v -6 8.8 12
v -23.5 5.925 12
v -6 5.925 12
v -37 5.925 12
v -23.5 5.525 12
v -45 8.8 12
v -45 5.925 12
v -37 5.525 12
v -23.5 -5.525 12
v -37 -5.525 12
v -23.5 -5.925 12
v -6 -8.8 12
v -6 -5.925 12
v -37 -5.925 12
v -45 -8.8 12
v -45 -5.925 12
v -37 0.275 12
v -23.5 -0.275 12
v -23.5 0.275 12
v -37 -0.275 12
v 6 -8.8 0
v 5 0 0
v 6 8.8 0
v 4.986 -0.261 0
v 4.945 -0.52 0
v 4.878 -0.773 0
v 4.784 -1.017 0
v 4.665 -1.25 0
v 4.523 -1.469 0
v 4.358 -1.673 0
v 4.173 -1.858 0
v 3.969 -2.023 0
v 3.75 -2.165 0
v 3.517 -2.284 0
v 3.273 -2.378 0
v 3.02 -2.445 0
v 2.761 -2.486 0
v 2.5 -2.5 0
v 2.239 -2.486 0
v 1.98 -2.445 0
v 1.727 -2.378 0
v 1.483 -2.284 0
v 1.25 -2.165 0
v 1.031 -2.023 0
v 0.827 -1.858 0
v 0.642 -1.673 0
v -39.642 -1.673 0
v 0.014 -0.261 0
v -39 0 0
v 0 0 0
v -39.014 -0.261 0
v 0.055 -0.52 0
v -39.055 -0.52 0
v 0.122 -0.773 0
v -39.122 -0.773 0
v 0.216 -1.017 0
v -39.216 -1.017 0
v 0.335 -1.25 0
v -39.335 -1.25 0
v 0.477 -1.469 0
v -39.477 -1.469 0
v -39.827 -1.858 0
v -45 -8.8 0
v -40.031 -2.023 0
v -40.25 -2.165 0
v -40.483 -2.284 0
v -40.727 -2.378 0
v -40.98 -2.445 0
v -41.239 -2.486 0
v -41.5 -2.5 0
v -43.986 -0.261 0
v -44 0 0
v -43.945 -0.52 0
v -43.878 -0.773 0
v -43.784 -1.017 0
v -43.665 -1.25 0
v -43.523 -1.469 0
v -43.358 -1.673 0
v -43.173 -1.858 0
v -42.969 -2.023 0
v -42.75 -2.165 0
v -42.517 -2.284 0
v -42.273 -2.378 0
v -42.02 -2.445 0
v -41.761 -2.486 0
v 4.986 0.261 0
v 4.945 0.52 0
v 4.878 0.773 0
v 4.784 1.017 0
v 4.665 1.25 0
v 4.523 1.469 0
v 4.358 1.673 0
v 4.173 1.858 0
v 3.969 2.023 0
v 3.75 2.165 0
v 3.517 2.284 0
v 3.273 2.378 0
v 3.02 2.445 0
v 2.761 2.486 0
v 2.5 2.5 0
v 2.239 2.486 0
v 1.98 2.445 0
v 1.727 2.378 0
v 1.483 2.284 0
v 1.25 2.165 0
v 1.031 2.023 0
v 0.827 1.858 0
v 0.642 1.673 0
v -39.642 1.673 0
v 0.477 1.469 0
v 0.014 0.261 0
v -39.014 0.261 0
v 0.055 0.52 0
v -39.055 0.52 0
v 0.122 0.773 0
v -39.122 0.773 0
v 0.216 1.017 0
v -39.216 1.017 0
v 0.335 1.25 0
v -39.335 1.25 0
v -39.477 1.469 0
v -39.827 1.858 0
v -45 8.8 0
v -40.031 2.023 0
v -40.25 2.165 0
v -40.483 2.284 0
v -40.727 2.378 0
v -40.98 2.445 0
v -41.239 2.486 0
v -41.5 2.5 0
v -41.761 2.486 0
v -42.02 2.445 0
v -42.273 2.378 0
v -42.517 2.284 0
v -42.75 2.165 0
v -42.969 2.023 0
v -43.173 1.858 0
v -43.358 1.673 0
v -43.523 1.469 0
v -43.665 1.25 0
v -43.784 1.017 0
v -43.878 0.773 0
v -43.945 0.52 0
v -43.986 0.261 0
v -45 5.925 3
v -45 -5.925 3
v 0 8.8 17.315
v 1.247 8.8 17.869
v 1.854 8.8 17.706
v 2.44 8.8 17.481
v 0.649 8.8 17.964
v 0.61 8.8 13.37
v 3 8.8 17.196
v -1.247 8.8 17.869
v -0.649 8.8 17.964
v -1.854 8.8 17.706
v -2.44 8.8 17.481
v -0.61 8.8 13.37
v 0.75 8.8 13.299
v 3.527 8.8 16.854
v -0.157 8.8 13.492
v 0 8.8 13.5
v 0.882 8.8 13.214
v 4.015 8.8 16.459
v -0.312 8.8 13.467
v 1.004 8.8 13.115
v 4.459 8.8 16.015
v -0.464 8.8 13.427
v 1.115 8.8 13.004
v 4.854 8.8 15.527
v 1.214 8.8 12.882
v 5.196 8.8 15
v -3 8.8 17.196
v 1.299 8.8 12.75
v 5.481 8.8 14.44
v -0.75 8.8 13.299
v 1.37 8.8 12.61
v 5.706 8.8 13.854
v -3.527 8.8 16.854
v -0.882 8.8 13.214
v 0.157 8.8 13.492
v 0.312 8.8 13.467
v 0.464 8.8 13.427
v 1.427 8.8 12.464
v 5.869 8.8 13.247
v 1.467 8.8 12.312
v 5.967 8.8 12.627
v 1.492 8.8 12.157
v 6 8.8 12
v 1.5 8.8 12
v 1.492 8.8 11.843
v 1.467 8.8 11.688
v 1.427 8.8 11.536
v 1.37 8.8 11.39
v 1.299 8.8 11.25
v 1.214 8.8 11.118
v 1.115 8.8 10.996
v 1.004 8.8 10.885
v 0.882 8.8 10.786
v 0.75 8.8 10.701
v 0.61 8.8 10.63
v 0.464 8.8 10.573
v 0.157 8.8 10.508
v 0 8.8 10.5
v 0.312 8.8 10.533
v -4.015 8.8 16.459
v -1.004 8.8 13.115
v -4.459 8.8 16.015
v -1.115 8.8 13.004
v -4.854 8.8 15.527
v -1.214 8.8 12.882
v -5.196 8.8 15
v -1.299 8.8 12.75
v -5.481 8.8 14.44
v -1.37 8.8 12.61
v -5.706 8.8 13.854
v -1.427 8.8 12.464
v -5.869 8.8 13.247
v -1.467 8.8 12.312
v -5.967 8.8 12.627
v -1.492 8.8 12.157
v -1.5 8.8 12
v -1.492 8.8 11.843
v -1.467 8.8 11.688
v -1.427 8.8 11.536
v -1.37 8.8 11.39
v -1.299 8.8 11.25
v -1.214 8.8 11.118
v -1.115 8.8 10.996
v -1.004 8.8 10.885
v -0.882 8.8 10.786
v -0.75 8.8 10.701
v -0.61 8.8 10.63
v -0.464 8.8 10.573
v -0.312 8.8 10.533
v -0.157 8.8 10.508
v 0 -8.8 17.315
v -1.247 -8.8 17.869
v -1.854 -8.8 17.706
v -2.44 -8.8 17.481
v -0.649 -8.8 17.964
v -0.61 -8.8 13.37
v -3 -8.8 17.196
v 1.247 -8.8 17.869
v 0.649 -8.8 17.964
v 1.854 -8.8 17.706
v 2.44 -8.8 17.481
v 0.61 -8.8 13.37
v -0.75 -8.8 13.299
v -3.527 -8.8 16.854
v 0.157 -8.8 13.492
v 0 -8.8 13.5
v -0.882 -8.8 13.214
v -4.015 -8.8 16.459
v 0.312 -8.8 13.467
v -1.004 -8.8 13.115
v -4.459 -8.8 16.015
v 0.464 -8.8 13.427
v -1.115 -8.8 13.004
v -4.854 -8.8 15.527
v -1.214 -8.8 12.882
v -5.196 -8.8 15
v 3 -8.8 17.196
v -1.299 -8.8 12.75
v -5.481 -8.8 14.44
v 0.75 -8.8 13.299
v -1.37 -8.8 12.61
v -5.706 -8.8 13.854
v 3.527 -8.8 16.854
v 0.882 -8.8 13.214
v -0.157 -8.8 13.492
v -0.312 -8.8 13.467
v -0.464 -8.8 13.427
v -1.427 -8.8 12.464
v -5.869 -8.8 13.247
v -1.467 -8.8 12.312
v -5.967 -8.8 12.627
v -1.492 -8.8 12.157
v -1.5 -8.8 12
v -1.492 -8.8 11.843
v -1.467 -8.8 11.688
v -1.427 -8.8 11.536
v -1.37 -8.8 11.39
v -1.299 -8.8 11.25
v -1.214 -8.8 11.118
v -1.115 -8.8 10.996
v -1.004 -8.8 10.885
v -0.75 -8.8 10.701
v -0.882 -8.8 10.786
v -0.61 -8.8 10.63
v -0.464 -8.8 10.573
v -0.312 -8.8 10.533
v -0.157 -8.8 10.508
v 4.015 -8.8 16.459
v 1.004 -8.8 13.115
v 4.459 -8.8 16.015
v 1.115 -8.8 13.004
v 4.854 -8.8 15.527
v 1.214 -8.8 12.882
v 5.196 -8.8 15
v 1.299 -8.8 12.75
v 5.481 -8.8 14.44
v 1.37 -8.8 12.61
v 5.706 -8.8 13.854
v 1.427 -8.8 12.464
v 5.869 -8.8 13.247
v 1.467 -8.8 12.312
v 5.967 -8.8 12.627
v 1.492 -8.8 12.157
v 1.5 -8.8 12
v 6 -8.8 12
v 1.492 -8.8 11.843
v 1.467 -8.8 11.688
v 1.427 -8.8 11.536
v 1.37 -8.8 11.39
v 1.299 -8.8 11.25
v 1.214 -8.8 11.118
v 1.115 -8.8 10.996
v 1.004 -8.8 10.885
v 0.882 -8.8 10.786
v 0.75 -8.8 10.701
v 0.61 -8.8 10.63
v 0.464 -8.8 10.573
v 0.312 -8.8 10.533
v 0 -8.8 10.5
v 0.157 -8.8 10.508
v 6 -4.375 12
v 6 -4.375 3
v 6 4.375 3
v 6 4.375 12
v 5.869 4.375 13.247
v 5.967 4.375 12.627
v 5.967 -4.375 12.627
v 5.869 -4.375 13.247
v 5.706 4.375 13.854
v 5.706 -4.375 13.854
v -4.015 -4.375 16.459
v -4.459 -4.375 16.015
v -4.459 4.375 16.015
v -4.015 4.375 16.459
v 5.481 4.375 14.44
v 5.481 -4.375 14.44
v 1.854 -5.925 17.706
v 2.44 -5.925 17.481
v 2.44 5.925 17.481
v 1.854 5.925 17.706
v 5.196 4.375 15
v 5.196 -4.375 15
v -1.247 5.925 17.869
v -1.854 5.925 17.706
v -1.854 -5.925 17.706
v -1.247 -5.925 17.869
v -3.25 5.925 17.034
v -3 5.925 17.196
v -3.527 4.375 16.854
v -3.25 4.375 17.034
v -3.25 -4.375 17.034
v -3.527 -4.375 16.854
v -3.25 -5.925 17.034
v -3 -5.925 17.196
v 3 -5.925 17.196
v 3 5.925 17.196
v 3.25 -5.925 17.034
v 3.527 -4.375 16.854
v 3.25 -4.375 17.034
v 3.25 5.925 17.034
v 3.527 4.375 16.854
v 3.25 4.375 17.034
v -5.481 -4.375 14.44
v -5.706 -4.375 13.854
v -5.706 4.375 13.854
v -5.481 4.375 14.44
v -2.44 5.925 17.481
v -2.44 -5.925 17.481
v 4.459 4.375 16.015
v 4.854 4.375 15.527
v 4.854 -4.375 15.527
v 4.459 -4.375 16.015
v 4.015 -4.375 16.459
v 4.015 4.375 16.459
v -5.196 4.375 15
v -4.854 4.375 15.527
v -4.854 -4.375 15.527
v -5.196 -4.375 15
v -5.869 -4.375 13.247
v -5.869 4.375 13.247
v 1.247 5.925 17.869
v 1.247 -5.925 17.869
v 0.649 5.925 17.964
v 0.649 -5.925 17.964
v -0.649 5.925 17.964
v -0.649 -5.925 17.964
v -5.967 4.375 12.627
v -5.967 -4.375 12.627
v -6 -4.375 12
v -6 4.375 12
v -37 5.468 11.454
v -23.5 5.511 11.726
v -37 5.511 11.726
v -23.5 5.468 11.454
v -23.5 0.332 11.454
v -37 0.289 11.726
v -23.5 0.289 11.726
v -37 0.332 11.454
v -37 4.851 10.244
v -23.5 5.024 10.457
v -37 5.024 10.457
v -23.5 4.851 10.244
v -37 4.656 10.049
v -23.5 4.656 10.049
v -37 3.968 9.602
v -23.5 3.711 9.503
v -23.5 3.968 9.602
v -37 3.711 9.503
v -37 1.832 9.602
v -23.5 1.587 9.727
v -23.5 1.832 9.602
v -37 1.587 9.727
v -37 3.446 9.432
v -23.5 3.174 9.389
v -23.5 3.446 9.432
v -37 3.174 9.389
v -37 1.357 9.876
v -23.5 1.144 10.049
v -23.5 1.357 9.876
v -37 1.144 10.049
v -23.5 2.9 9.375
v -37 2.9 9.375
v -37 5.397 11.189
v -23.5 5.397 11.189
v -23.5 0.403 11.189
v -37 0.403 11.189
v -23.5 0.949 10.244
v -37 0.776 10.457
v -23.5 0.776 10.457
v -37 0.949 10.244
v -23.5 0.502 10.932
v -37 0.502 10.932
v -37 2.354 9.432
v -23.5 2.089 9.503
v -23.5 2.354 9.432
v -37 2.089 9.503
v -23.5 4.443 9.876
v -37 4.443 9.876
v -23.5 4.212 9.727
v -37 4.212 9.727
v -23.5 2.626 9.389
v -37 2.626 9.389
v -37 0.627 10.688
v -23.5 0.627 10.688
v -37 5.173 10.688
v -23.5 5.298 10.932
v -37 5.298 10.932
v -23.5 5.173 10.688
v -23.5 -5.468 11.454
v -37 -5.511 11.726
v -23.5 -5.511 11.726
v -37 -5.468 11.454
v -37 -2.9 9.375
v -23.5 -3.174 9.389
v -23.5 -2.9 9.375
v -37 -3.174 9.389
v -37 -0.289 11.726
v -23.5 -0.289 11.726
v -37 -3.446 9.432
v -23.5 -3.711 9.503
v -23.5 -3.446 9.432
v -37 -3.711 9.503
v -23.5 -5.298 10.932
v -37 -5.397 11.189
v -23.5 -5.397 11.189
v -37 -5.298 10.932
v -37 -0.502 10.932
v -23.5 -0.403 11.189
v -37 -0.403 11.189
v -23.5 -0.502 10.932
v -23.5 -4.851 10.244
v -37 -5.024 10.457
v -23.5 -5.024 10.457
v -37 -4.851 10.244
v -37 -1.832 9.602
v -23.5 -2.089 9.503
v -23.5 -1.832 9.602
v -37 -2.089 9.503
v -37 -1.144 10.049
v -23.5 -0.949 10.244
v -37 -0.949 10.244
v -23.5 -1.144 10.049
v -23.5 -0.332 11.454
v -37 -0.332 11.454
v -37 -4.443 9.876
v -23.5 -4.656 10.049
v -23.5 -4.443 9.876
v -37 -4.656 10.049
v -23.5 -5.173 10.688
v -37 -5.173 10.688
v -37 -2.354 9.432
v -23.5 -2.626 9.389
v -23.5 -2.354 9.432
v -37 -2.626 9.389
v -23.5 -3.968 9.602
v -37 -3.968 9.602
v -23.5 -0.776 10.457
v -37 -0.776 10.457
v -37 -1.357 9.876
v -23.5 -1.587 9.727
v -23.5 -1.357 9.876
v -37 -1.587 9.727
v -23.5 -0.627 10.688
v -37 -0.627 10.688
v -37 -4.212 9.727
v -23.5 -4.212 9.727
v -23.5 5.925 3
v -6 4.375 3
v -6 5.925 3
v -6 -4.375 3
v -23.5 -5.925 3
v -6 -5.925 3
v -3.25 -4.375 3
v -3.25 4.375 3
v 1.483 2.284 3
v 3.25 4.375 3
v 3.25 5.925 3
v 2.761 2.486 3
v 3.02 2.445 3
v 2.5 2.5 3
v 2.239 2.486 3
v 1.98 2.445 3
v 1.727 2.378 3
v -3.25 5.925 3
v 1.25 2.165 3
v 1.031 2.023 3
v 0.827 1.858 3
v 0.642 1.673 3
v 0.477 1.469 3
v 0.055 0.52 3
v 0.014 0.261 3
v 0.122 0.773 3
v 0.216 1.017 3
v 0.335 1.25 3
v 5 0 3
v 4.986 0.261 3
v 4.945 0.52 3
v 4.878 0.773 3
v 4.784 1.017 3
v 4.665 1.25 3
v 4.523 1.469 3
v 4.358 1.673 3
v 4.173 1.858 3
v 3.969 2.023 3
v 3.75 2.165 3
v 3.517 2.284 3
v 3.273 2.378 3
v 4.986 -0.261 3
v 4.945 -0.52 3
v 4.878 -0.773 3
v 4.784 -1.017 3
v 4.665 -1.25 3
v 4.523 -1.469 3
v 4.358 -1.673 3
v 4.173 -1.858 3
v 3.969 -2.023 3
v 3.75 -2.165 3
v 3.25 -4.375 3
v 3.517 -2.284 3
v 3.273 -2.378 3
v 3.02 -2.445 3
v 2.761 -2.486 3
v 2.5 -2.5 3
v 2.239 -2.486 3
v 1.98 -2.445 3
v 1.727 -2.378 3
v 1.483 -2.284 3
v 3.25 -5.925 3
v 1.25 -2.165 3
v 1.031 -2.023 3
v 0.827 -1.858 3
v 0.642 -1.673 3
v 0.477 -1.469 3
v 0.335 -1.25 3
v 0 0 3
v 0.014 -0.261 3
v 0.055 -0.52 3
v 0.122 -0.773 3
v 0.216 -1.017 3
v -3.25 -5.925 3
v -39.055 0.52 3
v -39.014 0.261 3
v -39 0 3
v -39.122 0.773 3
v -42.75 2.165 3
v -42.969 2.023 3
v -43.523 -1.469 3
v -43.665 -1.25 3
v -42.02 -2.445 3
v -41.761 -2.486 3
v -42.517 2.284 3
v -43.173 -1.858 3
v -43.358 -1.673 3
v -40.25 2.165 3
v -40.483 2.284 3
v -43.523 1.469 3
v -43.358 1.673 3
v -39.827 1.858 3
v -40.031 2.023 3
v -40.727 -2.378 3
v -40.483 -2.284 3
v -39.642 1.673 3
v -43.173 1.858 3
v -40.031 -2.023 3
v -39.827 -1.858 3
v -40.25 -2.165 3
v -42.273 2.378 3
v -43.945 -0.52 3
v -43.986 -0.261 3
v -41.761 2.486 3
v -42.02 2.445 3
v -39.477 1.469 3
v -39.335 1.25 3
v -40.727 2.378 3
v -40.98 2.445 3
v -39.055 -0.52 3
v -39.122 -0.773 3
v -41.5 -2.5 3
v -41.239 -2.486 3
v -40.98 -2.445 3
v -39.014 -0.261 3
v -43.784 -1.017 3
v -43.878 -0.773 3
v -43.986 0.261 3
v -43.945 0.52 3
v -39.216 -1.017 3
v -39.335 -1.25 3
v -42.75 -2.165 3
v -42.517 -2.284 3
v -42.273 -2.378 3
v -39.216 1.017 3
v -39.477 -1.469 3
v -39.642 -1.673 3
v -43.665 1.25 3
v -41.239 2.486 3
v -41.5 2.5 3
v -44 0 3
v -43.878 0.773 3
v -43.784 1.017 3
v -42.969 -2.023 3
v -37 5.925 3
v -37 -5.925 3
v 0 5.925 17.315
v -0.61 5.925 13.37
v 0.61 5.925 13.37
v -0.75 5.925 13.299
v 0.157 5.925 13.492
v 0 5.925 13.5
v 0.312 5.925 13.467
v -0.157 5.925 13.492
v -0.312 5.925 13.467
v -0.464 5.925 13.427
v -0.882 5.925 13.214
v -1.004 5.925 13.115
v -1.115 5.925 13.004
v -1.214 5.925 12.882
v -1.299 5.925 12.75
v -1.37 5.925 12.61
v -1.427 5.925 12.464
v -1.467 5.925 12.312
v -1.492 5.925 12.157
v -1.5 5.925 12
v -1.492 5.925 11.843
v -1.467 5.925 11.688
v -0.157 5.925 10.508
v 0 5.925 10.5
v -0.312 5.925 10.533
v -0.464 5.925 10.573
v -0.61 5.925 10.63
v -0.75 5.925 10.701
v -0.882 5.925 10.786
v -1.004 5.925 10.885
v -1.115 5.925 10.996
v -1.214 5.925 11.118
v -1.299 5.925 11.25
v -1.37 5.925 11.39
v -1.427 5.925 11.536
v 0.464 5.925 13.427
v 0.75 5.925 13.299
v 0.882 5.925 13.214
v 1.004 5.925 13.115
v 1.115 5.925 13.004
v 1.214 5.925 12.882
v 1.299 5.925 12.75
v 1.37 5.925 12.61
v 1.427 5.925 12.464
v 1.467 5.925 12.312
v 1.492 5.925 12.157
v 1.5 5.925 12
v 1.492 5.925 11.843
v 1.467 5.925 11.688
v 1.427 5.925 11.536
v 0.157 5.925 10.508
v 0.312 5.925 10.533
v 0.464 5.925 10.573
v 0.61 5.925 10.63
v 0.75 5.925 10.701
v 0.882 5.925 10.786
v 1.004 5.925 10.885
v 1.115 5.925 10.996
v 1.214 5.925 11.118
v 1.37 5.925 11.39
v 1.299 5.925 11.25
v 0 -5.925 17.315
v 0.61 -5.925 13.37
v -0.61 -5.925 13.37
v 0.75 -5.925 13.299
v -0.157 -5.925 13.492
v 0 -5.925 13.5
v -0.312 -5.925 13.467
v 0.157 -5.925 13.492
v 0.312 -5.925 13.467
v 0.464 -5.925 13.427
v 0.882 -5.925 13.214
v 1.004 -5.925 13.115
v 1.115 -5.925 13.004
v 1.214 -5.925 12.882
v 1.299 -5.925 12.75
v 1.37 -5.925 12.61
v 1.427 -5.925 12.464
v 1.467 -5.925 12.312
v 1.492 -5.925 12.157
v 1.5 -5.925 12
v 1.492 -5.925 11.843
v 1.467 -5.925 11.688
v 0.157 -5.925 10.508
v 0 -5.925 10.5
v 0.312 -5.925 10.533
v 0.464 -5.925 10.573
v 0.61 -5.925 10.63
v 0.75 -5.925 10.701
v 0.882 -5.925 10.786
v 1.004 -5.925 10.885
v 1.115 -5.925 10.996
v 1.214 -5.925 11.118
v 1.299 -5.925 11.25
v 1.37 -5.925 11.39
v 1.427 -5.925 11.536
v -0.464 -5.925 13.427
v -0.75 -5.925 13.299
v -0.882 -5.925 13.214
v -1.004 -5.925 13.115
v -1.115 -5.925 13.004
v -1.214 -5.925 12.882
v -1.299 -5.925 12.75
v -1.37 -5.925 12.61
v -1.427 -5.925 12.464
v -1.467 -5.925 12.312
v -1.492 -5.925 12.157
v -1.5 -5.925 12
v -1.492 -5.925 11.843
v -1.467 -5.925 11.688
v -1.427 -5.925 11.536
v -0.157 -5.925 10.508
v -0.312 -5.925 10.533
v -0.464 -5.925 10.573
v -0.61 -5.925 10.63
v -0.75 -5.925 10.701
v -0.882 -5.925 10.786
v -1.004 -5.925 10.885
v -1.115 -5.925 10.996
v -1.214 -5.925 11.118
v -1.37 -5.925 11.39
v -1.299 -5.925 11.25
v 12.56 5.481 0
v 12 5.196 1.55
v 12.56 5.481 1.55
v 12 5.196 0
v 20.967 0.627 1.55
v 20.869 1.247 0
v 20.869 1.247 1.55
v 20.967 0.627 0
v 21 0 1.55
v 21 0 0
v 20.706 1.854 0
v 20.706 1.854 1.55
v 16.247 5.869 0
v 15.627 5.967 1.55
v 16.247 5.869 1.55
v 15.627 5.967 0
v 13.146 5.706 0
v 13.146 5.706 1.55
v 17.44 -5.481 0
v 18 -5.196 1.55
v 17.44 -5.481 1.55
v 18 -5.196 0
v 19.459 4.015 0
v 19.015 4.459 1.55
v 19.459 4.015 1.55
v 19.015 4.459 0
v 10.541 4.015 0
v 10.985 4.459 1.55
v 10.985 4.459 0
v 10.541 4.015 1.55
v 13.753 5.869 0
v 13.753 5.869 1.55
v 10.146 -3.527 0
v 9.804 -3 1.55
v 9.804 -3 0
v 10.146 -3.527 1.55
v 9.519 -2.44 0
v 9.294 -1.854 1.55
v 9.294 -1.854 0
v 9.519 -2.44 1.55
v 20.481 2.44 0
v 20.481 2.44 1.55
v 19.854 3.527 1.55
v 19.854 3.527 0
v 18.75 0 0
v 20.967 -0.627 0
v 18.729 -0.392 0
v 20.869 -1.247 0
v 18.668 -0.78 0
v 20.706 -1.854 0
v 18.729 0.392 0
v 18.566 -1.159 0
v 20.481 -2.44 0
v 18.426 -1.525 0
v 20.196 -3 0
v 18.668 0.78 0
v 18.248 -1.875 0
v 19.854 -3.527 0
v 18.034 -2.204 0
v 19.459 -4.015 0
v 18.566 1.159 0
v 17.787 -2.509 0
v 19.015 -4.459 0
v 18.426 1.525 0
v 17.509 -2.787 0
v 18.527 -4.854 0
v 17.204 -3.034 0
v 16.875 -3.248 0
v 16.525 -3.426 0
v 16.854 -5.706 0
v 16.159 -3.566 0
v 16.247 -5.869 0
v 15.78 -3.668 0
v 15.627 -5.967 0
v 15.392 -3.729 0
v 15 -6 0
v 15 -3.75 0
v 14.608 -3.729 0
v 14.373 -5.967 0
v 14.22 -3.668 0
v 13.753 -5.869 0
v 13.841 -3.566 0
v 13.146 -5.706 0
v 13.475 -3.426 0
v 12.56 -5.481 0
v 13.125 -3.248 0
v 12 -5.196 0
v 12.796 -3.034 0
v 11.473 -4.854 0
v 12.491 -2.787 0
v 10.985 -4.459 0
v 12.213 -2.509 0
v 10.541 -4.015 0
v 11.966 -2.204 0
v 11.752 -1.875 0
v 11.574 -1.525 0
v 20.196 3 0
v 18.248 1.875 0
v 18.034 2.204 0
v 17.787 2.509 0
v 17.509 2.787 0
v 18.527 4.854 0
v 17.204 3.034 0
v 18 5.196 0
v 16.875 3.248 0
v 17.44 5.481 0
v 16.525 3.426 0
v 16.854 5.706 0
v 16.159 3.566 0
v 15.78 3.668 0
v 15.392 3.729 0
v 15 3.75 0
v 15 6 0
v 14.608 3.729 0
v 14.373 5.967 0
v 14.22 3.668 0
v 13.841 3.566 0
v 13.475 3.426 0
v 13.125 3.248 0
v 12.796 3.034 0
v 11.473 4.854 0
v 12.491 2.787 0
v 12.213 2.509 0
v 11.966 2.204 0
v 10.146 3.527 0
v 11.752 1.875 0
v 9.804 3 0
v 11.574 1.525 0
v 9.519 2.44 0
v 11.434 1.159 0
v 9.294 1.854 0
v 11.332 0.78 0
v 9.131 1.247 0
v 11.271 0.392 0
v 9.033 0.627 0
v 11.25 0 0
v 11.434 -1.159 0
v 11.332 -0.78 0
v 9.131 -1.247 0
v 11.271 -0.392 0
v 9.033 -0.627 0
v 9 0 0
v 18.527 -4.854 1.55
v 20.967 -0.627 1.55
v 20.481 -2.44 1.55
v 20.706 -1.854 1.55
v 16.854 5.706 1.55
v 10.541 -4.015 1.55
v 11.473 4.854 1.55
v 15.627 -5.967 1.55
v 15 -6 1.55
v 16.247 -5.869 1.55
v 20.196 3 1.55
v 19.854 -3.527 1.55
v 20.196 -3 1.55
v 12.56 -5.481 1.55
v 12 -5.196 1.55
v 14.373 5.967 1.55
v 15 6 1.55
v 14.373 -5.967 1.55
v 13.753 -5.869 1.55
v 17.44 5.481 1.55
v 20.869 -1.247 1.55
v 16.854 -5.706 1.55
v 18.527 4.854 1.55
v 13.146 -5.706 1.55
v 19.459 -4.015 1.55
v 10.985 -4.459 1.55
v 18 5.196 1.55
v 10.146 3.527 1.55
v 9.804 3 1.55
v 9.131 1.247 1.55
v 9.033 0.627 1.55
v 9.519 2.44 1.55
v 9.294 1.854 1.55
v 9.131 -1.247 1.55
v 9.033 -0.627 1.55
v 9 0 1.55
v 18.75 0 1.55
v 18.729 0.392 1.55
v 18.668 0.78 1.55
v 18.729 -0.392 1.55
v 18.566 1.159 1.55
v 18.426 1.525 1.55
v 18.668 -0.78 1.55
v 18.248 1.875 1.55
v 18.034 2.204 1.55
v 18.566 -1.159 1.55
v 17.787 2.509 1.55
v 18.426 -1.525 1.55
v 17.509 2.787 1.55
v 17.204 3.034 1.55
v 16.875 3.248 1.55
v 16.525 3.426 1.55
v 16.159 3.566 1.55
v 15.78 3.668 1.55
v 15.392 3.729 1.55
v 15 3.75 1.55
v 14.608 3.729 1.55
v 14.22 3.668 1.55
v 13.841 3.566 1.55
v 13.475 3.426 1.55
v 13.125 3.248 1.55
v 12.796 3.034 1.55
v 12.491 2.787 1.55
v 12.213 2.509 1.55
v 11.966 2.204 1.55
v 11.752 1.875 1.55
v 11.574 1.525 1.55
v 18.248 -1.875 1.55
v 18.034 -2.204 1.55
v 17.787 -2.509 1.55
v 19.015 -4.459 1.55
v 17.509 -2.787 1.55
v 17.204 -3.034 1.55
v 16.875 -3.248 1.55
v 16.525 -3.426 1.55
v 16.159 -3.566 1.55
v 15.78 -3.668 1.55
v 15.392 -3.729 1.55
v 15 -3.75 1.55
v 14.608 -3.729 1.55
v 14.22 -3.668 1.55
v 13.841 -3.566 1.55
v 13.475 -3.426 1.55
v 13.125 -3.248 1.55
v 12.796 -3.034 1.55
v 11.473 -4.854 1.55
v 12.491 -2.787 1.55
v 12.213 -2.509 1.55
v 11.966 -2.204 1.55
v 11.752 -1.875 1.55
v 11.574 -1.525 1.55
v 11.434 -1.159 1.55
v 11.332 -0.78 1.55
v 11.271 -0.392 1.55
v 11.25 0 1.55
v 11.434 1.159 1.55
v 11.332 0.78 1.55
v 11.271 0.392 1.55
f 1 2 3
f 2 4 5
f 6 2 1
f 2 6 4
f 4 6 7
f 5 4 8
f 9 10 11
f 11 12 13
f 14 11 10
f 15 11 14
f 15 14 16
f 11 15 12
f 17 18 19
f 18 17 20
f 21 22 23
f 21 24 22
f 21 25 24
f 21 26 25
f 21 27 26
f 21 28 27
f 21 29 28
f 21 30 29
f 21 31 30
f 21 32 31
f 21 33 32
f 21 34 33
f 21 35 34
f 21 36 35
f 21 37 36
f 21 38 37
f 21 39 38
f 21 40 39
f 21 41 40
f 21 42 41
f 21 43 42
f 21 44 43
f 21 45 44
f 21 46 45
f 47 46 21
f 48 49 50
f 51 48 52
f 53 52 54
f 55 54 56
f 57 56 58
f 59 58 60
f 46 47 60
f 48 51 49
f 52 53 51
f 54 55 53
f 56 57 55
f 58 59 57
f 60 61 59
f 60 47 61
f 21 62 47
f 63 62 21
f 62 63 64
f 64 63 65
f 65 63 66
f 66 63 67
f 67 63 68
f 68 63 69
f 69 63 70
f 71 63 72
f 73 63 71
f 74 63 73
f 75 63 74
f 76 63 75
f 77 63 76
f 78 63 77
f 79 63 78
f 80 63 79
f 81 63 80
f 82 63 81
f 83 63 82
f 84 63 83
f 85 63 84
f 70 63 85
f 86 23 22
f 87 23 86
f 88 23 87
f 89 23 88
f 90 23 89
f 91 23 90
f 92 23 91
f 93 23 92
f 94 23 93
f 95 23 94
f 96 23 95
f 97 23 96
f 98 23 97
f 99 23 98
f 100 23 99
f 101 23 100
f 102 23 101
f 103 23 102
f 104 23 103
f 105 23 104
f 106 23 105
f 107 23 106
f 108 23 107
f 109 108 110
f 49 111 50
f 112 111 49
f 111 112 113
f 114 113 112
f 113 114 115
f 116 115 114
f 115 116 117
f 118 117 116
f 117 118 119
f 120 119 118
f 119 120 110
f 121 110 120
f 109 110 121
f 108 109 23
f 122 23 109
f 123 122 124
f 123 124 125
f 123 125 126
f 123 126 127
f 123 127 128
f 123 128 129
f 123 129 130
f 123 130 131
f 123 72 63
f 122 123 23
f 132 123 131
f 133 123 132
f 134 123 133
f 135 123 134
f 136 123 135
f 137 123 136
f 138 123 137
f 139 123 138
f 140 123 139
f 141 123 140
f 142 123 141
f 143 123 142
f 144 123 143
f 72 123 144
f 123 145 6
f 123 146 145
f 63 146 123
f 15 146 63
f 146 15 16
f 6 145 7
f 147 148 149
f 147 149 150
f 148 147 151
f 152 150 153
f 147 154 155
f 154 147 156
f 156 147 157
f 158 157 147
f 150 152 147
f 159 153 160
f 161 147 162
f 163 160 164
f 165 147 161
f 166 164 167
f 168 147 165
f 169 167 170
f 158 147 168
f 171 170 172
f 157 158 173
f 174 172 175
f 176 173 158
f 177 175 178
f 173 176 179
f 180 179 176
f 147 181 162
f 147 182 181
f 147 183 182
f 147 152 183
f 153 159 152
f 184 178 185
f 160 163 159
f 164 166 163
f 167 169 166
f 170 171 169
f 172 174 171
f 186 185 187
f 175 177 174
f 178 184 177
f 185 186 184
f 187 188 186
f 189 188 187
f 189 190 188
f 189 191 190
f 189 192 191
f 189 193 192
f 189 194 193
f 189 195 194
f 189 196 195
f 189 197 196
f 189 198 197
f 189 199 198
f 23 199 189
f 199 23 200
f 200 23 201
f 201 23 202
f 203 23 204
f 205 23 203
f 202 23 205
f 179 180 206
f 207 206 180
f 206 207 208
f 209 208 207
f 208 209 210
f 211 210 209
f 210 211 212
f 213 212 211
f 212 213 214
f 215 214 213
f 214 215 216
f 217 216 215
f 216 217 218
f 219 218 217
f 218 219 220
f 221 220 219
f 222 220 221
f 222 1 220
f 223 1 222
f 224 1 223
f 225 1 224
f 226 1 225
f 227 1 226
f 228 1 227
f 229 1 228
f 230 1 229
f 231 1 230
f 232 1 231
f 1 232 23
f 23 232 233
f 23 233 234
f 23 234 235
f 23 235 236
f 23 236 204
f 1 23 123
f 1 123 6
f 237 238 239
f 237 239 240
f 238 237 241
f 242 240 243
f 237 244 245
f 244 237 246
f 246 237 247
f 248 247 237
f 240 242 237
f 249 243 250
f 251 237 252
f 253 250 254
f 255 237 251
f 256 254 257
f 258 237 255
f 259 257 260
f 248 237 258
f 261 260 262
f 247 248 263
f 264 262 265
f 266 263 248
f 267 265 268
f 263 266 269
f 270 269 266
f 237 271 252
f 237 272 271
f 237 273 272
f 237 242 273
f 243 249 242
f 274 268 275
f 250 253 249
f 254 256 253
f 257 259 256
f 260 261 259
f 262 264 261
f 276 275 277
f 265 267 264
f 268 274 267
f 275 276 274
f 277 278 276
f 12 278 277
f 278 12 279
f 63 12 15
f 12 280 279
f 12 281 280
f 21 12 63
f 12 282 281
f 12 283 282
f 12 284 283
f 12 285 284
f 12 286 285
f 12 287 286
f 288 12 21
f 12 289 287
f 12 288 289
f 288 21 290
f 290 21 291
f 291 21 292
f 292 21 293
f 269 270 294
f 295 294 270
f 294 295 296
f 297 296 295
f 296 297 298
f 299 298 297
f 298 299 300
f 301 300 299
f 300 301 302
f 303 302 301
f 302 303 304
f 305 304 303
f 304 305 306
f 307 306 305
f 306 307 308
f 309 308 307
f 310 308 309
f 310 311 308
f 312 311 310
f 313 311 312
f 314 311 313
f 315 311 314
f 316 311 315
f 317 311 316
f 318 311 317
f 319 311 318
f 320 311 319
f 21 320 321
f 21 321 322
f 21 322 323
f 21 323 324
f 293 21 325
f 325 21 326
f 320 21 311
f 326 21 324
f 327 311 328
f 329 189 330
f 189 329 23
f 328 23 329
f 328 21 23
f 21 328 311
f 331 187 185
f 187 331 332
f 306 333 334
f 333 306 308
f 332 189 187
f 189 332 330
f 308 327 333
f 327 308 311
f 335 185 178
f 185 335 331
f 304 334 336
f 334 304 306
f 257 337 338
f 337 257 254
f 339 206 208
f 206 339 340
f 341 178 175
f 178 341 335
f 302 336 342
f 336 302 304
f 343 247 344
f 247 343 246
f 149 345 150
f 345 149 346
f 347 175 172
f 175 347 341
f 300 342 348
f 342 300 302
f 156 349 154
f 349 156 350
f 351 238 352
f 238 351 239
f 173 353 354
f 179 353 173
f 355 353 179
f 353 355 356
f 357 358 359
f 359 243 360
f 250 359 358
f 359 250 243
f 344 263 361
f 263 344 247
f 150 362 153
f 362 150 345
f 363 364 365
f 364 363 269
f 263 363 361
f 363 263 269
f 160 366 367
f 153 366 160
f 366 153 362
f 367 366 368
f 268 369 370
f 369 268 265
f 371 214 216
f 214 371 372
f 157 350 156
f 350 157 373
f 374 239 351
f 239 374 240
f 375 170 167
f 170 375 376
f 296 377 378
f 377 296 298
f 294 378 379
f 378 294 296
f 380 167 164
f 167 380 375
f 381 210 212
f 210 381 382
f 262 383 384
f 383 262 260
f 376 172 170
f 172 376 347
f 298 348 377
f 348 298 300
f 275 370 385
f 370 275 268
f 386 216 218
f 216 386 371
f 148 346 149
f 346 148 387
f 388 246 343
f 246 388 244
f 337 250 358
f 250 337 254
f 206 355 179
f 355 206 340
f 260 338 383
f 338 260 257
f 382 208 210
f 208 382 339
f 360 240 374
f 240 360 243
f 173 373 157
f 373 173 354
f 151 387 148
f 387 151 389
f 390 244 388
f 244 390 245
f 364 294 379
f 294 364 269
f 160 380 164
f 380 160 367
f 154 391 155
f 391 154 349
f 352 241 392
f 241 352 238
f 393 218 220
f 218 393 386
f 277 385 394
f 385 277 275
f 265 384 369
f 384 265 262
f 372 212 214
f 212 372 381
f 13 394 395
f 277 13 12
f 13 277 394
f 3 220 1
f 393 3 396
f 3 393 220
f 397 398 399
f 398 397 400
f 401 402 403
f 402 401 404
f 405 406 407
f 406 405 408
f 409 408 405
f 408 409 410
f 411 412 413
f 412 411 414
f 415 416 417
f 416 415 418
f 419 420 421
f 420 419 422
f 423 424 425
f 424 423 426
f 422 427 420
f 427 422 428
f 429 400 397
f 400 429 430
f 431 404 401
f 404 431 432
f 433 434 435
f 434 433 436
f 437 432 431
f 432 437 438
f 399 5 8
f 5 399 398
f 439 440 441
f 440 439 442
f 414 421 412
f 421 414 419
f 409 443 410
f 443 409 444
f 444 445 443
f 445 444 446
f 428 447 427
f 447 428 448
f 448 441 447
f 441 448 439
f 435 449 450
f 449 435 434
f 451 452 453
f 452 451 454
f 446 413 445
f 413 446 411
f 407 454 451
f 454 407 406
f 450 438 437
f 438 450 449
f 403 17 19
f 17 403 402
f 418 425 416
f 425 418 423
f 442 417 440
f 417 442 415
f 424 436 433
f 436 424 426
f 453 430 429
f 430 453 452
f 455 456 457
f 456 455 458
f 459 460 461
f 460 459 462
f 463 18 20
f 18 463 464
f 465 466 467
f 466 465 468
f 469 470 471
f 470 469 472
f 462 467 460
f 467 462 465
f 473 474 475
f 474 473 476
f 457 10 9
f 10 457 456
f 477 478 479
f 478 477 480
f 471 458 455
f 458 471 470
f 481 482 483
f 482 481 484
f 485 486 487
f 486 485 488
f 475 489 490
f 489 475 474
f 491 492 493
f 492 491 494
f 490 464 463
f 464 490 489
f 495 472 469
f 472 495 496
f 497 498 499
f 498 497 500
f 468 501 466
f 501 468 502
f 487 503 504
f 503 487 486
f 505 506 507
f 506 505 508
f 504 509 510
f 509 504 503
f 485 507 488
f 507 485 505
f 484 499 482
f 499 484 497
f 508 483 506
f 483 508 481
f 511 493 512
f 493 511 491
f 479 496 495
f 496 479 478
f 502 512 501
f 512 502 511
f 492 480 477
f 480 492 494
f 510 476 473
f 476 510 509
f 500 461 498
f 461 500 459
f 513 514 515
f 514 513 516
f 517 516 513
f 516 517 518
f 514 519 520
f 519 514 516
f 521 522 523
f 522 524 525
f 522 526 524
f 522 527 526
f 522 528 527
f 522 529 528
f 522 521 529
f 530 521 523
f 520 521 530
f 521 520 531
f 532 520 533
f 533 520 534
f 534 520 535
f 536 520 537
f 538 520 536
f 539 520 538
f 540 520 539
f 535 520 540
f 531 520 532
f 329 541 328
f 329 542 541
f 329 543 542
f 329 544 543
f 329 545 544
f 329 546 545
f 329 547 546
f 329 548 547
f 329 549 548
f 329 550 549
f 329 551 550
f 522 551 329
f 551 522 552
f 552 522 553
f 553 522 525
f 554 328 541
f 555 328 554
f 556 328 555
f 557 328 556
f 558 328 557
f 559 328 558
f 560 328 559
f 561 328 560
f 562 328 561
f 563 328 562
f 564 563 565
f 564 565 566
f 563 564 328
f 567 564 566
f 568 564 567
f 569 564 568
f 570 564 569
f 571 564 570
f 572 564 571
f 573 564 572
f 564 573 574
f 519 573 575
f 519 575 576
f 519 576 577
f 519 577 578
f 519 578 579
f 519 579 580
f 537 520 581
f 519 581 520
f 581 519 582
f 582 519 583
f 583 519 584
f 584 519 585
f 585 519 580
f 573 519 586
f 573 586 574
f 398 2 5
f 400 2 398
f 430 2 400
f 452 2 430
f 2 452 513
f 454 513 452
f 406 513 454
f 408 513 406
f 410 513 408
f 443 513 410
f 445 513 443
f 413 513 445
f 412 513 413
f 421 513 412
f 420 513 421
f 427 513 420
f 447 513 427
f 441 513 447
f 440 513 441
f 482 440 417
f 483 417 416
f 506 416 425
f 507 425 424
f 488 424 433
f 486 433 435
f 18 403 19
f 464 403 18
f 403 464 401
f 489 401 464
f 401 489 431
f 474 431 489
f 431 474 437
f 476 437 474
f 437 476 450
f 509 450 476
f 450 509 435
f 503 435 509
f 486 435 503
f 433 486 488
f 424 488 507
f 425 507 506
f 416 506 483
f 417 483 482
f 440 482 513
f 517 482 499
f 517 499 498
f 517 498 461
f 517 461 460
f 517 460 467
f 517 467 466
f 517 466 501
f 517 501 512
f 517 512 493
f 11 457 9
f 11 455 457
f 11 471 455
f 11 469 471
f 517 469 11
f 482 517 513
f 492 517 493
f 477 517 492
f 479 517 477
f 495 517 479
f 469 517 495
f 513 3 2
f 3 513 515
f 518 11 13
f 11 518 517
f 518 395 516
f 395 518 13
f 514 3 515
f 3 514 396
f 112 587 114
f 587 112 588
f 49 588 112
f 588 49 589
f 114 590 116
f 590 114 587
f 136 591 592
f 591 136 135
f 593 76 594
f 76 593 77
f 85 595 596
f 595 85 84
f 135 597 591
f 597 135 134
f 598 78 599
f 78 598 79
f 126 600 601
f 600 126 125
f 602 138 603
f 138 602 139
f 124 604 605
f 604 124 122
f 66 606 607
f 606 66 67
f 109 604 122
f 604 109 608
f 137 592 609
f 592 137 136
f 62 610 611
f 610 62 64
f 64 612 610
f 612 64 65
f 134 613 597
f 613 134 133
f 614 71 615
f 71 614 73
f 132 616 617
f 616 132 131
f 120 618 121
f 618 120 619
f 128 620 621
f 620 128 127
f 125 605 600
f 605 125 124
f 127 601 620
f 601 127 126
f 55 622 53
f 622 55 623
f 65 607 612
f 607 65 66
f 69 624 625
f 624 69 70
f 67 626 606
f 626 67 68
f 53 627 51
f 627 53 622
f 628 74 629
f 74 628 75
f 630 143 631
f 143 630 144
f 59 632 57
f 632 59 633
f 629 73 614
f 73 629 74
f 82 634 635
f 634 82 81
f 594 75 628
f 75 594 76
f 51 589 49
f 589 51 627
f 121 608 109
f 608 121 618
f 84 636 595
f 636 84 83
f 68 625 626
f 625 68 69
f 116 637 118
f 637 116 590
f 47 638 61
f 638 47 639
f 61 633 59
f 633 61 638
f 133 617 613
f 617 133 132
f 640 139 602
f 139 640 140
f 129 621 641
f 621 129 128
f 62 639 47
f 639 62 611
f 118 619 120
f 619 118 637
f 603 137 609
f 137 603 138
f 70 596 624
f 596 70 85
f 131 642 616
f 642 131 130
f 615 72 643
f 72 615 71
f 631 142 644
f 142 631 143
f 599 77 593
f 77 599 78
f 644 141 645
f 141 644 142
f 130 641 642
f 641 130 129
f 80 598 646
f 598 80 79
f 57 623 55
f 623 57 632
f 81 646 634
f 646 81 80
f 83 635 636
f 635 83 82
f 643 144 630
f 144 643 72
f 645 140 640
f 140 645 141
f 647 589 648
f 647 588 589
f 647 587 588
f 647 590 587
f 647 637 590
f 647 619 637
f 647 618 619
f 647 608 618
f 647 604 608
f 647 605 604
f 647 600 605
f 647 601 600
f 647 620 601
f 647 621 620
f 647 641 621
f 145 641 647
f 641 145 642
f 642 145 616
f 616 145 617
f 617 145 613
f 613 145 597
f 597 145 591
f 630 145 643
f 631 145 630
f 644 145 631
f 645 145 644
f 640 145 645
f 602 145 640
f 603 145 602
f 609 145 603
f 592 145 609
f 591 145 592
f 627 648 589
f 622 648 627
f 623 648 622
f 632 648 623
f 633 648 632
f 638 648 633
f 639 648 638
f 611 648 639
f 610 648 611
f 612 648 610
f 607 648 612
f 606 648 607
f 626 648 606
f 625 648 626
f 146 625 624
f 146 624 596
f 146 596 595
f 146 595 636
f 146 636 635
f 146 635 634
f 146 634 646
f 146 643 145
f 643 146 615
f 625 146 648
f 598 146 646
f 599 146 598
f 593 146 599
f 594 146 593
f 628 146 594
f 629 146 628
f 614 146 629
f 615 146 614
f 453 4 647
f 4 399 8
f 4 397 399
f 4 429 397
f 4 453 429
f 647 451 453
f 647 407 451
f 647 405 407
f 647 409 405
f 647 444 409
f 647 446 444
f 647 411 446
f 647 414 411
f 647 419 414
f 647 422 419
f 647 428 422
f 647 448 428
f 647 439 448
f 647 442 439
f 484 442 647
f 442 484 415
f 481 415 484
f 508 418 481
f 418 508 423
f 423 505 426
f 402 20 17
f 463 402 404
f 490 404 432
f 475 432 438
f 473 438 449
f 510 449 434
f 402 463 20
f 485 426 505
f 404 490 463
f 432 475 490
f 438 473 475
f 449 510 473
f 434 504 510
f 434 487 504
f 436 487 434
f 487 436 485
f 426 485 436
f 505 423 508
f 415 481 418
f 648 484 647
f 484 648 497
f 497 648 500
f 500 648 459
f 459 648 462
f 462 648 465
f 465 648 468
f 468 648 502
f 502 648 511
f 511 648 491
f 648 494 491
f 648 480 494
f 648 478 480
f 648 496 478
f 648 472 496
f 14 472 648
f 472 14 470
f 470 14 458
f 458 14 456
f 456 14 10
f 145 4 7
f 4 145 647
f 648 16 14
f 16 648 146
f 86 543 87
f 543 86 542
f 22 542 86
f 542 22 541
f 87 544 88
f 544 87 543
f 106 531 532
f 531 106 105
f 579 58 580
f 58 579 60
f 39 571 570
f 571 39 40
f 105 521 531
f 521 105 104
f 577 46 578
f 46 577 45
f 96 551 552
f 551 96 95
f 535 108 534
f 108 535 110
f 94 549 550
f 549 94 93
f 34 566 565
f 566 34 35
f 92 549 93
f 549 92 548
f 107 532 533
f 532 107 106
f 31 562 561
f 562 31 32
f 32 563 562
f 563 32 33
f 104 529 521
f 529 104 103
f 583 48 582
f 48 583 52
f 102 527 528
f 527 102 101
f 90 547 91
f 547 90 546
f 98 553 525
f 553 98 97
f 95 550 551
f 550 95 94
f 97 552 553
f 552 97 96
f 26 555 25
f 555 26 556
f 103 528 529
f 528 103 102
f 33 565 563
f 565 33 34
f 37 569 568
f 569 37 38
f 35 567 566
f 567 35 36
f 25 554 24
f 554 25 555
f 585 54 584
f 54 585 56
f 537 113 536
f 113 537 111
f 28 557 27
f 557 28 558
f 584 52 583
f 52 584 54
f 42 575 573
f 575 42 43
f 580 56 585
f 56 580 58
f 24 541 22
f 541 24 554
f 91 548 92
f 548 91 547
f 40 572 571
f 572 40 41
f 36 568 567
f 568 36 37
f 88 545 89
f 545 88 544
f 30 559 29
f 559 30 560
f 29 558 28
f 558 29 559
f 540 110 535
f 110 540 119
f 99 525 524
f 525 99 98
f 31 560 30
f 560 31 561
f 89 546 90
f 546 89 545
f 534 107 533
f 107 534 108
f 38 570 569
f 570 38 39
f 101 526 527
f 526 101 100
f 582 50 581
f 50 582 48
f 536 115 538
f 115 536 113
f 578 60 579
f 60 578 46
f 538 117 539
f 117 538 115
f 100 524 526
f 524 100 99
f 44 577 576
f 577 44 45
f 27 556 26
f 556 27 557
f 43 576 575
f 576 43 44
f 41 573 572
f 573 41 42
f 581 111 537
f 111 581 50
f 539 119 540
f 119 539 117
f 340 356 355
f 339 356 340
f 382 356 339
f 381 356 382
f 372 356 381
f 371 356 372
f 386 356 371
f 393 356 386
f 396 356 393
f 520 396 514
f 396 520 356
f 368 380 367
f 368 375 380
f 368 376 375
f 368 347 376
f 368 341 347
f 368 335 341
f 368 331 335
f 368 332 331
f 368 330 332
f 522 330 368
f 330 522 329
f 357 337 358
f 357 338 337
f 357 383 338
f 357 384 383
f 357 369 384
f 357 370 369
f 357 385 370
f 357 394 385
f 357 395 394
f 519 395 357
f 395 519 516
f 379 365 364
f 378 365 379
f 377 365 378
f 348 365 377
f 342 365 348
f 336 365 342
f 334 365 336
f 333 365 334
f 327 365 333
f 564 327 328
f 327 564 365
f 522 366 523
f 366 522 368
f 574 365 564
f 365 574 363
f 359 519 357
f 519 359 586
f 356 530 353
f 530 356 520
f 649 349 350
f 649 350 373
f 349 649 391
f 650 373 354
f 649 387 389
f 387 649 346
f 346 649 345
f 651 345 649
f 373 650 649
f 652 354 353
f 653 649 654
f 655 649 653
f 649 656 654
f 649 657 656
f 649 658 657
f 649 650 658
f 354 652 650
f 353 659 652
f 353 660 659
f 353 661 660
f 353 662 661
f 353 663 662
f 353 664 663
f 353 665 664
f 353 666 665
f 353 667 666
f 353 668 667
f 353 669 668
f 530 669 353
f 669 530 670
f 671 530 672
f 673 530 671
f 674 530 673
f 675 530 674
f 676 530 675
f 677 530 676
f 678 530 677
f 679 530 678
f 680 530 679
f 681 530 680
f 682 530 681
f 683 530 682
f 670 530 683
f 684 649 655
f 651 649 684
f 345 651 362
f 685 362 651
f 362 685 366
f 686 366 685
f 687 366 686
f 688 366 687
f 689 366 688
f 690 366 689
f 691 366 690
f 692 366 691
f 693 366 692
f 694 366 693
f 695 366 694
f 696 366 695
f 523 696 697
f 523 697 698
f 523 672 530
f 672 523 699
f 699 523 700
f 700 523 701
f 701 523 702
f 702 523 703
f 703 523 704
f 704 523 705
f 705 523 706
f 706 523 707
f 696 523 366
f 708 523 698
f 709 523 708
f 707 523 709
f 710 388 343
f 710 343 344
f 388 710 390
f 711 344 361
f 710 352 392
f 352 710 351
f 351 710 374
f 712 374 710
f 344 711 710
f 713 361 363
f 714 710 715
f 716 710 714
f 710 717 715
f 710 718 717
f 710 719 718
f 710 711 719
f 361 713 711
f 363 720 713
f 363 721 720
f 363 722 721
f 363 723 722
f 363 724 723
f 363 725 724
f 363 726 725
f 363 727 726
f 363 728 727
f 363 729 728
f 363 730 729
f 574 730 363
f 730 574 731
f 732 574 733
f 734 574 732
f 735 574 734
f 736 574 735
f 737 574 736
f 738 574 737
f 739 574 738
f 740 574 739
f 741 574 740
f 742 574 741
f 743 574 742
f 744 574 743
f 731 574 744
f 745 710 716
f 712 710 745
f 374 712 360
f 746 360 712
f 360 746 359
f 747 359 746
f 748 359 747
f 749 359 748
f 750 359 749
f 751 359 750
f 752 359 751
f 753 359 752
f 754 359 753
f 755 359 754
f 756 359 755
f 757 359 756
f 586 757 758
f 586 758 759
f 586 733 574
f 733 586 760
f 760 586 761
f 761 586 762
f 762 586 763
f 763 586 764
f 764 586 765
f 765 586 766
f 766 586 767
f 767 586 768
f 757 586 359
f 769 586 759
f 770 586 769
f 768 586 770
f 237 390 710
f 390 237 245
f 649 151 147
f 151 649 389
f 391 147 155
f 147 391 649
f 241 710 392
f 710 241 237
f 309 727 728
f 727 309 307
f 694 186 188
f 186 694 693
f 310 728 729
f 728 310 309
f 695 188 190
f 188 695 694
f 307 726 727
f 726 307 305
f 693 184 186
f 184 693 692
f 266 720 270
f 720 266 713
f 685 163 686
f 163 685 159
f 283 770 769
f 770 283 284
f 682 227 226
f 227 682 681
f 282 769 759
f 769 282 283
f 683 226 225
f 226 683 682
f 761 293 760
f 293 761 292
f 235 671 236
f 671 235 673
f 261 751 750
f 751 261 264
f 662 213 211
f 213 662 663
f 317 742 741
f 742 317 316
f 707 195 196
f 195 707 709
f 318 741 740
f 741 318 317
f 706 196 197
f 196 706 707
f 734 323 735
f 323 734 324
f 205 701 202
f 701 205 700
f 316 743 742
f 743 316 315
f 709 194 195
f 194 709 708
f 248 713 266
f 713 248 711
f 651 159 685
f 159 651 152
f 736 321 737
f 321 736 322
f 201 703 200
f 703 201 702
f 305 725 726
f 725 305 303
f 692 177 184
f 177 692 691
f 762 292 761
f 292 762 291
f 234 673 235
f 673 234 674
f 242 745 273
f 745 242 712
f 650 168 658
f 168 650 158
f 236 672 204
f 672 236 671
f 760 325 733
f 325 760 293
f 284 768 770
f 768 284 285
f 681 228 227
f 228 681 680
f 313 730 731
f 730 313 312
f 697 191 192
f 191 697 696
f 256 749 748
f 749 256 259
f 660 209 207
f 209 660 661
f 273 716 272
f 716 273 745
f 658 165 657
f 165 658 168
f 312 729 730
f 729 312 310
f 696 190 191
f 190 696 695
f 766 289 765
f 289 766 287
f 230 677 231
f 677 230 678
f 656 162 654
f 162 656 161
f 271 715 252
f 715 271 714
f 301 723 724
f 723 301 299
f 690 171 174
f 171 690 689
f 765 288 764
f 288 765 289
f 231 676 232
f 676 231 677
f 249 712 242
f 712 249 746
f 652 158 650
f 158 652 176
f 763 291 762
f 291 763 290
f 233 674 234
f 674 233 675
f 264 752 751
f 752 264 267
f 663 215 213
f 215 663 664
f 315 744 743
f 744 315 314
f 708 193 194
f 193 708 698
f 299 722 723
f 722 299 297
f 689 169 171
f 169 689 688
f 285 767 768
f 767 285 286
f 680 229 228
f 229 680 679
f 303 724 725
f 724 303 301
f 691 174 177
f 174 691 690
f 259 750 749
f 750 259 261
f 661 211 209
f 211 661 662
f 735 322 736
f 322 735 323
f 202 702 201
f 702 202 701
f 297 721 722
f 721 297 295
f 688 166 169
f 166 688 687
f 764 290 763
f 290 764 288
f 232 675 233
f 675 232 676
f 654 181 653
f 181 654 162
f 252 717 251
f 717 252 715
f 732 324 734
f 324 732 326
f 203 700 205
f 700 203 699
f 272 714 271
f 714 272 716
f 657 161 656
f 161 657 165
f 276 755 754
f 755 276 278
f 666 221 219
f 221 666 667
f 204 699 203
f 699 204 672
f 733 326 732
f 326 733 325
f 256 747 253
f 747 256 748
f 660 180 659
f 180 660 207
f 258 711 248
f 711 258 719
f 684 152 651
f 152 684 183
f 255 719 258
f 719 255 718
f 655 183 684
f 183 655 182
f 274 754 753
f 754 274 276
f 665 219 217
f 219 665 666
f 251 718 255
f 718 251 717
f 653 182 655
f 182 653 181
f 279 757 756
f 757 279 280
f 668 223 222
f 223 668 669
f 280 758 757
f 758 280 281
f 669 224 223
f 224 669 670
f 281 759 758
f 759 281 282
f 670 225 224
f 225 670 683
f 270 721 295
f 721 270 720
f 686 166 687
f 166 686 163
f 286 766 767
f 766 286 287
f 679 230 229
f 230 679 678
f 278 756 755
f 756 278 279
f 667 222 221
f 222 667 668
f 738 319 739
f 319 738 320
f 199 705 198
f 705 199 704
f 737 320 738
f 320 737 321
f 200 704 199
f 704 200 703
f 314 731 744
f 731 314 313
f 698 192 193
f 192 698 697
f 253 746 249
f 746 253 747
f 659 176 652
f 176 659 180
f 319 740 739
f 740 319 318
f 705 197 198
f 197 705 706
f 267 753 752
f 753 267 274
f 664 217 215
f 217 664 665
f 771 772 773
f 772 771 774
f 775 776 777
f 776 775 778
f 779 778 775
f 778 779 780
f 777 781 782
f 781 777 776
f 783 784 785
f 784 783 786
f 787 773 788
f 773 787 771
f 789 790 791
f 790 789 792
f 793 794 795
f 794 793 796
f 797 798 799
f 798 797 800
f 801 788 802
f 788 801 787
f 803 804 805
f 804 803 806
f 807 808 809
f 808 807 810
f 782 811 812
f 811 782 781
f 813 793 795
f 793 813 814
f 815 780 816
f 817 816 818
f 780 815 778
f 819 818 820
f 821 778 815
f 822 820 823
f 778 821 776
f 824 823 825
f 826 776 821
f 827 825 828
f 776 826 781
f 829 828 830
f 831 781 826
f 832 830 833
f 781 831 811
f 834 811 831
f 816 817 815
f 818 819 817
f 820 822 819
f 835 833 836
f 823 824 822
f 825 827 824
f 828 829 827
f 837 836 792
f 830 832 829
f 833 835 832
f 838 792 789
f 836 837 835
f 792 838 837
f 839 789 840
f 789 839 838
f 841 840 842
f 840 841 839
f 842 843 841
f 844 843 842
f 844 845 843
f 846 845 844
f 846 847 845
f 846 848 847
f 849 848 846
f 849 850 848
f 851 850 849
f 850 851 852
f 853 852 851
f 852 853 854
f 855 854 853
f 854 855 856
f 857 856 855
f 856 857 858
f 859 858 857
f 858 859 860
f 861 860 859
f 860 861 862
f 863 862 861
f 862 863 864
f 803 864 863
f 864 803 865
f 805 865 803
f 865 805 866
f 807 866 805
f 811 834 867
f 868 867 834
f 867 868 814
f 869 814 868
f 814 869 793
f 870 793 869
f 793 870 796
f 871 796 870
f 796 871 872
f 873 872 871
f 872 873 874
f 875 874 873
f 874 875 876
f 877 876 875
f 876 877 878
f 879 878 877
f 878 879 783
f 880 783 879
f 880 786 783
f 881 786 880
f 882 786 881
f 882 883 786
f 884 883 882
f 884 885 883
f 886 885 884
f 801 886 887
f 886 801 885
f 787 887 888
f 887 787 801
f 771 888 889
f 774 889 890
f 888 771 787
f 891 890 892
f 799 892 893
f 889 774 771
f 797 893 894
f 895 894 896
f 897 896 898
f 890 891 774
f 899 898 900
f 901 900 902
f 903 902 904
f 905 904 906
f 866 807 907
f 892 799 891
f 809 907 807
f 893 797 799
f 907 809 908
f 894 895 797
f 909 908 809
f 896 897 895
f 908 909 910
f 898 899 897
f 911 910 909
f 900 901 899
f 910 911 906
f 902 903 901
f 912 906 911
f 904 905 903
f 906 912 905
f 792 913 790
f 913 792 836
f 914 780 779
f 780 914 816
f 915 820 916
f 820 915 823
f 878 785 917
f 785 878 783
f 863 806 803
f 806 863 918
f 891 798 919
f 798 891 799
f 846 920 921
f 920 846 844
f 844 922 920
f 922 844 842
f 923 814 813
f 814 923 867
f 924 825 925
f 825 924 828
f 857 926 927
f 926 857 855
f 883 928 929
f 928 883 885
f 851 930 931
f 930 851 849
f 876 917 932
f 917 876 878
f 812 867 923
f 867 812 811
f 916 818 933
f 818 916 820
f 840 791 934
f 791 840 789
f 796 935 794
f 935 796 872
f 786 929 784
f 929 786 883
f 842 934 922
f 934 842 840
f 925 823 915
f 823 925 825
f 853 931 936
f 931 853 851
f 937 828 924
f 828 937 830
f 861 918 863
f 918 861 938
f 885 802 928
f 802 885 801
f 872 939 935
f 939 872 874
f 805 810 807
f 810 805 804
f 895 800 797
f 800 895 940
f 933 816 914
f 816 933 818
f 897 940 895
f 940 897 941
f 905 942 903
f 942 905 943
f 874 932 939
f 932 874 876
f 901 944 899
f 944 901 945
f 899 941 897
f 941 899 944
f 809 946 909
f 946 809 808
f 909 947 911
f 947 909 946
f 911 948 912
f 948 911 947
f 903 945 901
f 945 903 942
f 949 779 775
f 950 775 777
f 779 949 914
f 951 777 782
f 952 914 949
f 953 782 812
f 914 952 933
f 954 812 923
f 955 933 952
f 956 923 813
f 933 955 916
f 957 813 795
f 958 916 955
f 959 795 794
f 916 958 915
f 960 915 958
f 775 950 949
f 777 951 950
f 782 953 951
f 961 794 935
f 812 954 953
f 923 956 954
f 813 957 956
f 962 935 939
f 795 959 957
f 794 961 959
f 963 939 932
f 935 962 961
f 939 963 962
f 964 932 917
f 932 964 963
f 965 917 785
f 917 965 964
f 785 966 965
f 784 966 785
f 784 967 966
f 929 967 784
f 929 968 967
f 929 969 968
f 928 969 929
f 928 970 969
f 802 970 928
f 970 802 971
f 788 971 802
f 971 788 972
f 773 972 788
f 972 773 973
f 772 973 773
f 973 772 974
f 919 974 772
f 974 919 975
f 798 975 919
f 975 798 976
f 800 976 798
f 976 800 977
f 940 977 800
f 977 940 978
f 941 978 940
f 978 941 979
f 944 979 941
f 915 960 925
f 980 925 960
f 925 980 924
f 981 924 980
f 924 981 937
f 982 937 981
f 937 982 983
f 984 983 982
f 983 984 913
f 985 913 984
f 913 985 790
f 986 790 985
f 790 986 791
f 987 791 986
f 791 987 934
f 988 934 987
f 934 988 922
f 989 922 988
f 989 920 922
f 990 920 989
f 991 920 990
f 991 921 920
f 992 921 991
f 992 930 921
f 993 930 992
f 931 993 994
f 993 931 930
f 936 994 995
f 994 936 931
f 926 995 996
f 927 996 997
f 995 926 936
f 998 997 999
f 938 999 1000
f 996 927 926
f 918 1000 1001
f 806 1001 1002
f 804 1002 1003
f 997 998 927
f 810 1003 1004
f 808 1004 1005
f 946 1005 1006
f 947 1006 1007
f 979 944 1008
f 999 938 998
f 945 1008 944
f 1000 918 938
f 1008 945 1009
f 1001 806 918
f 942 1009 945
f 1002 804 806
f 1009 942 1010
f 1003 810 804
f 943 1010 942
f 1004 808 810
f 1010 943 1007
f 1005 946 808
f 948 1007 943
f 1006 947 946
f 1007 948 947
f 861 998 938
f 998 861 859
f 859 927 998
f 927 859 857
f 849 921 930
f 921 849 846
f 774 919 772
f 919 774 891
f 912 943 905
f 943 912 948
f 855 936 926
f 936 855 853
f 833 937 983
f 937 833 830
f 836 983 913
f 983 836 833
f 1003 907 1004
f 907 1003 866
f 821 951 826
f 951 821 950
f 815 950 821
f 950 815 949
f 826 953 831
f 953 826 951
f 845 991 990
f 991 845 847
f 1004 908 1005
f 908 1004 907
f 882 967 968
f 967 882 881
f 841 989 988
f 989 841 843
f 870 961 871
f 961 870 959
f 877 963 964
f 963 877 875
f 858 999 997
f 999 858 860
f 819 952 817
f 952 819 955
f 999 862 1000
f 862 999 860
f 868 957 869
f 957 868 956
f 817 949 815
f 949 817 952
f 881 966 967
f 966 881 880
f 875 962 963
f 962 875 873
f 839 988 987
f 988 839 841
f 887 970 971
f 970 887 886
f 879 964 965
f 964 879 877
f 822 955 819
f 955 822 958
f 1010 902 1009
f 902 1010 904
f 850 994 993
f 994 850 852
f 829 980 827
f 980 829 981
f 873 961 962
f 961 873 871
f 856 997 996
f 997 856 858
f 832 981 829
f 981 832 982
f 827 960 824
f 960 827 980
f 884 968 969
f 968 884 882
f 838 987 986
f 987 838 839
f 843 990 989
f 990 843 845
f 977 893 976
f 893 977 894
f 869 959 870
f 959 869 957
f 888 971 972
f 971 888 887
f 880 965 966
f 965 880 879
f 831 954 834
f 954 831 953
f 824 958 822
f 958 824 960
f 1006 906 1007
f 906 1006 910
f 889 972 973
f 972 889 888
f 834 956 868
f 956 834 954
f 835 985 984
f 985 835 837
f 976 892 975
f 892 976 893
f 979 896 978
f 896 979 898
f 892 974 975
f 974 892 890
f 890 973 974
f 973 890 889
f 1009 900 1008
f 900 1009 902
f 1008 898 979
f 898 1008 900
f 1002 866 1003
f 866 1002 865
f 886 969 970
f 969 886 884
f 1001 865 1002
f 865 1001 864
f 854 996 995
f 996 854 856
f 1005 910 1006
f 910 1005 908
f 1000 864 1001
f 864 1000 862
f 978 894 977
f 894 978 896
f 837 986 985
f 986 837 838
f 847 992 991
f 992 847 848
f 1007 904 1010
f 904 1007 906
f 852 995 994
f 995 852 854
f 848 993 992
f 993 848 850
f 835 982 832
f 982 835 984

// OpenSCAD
/* [Eyelet dimensions] */

// thckness of jig walls
wall_t=3;

// insert internal diameter
eye_insert_id=3;

// insert outer diameter for spacer sizing
eye_insert_od=6.5;

// eyelet outer diameter for spacer sizing
eye_od=12;

// width of the insert
eye_insert_w=5.8;

// width of the outer shell
eye_outer_w=4.25;

// length from tip of threaded part to center of mounting hole
eye_l=45;

// length of the threaded part
eye_thread_l=17;

/* [Diagonal rod size] */

// outer diameter
rod_od=5;

// length
rod_l=310;

/* [Diagonal total length] */

// space between centers of bolt holes on either end of rod
eye_space=325;

/* [Hidden] */

$fn=60;

// diameter of screws to be used
screw_d=3;

screw_l=2*eye_insert_w+2*wall_t;

extrusion_w=20;

mount_screw_d=5;
mount_screw_head_d=7;
mount_screw_head_h=4;

assembly_offset=wall_t+mount_screw_head_h+rod_od;
rod_support_w=2*eye_insert_w+2*wall_t;

spacer_w=eye_insert_w-eye_outer_w;

module spacer(){
    translate([1.25*eye_od,0,spacer_w/2]) difference(){
        cylinder(d=eye_od,h=spacer_w,center=true);
        cylinder(d=eye_insert_od+1,h=spacer_w+0.1,center=true);
    }
}

//!eye_support();
module eye_support(){
    translate([0,0,assembly_offset/2])difference(){
        union(){
            translate([-eye_l/2,0,0])cube([eye_l,rod_support_w,assembly_offset],center=true);
            cube([eye_od,rod_support_w,assembly_offset],center=true);
            translate([0,0,assembly_offset/2])rotate([90,0,0])cylinder(d=eye_od,h=rod_support_w,center=true);
        }
        // rod cradle
        for (m=[0,1])mirror([0,m,0])translate([-eye_l,eye_insert_w/2,assembly_offset/2])rotate([0,90,0])cylinder(d=rod_od+0.25,h=eye_l,center=true);
        // eye cutout
        translate([0,0,eye_od/2+wall_t])difference(){
            cube([eye_l+2,2*eye_insert_w+0.25,assembly_offset+eye_od],center=true);
            cube([eye_od,2*eye_insert_w+1,assembly_offset+eye_od+1],center=true);
        }
        translate([0,0,eye_od/2+wall_t])cube([eye_od*2,2*eye_outer_w+0.25,assembly_offset+eye_od],center=true);
        translate([0,0,eye_od/2+wall_t])cube([eye_insert_od,2*eye_insert_w+0.25,assembly_offset+eye_od],center=true);
        // alignment_notch
        translate([0,0,assembly_offset/2+1.15*eye_od])rotate([0,45,0])cube([eye_od,rod_support_w+1,eye_od],center=true);
        // screw_hole
        translate([0,0,assembly_offset/2])rotate([90,0,0])cylinder(d=eye_insert_id,h=rod_support_w+1,center=true);
        // mount screws
        translate([-(eye_l-mount_screw_head_d/2),0,0]){
            cylinder(d=mount_screw_d,h=assembly_offset+2,center=true);
            translate([0,0,wall_t])cylinder(d=mount_screw_head_d,h=assembly_offset,center=true);
            translate([0,0,wall_t])cube([mount_screw_head_d+2,2*eye_insert_w+0.25,assembly_offset],center=true);
        }
        translate([(eye_od-mount_screw_head_d)/2,0,0]){
            cylinder(d=mount_screw_d,h=assembly_offset+2,center=true);
            translate([0,0,wall_t])cylinder(d=mount_screw_head_d,h=assembly_offset,center=true);
        }
    }
}

eye_support();
spacer();
